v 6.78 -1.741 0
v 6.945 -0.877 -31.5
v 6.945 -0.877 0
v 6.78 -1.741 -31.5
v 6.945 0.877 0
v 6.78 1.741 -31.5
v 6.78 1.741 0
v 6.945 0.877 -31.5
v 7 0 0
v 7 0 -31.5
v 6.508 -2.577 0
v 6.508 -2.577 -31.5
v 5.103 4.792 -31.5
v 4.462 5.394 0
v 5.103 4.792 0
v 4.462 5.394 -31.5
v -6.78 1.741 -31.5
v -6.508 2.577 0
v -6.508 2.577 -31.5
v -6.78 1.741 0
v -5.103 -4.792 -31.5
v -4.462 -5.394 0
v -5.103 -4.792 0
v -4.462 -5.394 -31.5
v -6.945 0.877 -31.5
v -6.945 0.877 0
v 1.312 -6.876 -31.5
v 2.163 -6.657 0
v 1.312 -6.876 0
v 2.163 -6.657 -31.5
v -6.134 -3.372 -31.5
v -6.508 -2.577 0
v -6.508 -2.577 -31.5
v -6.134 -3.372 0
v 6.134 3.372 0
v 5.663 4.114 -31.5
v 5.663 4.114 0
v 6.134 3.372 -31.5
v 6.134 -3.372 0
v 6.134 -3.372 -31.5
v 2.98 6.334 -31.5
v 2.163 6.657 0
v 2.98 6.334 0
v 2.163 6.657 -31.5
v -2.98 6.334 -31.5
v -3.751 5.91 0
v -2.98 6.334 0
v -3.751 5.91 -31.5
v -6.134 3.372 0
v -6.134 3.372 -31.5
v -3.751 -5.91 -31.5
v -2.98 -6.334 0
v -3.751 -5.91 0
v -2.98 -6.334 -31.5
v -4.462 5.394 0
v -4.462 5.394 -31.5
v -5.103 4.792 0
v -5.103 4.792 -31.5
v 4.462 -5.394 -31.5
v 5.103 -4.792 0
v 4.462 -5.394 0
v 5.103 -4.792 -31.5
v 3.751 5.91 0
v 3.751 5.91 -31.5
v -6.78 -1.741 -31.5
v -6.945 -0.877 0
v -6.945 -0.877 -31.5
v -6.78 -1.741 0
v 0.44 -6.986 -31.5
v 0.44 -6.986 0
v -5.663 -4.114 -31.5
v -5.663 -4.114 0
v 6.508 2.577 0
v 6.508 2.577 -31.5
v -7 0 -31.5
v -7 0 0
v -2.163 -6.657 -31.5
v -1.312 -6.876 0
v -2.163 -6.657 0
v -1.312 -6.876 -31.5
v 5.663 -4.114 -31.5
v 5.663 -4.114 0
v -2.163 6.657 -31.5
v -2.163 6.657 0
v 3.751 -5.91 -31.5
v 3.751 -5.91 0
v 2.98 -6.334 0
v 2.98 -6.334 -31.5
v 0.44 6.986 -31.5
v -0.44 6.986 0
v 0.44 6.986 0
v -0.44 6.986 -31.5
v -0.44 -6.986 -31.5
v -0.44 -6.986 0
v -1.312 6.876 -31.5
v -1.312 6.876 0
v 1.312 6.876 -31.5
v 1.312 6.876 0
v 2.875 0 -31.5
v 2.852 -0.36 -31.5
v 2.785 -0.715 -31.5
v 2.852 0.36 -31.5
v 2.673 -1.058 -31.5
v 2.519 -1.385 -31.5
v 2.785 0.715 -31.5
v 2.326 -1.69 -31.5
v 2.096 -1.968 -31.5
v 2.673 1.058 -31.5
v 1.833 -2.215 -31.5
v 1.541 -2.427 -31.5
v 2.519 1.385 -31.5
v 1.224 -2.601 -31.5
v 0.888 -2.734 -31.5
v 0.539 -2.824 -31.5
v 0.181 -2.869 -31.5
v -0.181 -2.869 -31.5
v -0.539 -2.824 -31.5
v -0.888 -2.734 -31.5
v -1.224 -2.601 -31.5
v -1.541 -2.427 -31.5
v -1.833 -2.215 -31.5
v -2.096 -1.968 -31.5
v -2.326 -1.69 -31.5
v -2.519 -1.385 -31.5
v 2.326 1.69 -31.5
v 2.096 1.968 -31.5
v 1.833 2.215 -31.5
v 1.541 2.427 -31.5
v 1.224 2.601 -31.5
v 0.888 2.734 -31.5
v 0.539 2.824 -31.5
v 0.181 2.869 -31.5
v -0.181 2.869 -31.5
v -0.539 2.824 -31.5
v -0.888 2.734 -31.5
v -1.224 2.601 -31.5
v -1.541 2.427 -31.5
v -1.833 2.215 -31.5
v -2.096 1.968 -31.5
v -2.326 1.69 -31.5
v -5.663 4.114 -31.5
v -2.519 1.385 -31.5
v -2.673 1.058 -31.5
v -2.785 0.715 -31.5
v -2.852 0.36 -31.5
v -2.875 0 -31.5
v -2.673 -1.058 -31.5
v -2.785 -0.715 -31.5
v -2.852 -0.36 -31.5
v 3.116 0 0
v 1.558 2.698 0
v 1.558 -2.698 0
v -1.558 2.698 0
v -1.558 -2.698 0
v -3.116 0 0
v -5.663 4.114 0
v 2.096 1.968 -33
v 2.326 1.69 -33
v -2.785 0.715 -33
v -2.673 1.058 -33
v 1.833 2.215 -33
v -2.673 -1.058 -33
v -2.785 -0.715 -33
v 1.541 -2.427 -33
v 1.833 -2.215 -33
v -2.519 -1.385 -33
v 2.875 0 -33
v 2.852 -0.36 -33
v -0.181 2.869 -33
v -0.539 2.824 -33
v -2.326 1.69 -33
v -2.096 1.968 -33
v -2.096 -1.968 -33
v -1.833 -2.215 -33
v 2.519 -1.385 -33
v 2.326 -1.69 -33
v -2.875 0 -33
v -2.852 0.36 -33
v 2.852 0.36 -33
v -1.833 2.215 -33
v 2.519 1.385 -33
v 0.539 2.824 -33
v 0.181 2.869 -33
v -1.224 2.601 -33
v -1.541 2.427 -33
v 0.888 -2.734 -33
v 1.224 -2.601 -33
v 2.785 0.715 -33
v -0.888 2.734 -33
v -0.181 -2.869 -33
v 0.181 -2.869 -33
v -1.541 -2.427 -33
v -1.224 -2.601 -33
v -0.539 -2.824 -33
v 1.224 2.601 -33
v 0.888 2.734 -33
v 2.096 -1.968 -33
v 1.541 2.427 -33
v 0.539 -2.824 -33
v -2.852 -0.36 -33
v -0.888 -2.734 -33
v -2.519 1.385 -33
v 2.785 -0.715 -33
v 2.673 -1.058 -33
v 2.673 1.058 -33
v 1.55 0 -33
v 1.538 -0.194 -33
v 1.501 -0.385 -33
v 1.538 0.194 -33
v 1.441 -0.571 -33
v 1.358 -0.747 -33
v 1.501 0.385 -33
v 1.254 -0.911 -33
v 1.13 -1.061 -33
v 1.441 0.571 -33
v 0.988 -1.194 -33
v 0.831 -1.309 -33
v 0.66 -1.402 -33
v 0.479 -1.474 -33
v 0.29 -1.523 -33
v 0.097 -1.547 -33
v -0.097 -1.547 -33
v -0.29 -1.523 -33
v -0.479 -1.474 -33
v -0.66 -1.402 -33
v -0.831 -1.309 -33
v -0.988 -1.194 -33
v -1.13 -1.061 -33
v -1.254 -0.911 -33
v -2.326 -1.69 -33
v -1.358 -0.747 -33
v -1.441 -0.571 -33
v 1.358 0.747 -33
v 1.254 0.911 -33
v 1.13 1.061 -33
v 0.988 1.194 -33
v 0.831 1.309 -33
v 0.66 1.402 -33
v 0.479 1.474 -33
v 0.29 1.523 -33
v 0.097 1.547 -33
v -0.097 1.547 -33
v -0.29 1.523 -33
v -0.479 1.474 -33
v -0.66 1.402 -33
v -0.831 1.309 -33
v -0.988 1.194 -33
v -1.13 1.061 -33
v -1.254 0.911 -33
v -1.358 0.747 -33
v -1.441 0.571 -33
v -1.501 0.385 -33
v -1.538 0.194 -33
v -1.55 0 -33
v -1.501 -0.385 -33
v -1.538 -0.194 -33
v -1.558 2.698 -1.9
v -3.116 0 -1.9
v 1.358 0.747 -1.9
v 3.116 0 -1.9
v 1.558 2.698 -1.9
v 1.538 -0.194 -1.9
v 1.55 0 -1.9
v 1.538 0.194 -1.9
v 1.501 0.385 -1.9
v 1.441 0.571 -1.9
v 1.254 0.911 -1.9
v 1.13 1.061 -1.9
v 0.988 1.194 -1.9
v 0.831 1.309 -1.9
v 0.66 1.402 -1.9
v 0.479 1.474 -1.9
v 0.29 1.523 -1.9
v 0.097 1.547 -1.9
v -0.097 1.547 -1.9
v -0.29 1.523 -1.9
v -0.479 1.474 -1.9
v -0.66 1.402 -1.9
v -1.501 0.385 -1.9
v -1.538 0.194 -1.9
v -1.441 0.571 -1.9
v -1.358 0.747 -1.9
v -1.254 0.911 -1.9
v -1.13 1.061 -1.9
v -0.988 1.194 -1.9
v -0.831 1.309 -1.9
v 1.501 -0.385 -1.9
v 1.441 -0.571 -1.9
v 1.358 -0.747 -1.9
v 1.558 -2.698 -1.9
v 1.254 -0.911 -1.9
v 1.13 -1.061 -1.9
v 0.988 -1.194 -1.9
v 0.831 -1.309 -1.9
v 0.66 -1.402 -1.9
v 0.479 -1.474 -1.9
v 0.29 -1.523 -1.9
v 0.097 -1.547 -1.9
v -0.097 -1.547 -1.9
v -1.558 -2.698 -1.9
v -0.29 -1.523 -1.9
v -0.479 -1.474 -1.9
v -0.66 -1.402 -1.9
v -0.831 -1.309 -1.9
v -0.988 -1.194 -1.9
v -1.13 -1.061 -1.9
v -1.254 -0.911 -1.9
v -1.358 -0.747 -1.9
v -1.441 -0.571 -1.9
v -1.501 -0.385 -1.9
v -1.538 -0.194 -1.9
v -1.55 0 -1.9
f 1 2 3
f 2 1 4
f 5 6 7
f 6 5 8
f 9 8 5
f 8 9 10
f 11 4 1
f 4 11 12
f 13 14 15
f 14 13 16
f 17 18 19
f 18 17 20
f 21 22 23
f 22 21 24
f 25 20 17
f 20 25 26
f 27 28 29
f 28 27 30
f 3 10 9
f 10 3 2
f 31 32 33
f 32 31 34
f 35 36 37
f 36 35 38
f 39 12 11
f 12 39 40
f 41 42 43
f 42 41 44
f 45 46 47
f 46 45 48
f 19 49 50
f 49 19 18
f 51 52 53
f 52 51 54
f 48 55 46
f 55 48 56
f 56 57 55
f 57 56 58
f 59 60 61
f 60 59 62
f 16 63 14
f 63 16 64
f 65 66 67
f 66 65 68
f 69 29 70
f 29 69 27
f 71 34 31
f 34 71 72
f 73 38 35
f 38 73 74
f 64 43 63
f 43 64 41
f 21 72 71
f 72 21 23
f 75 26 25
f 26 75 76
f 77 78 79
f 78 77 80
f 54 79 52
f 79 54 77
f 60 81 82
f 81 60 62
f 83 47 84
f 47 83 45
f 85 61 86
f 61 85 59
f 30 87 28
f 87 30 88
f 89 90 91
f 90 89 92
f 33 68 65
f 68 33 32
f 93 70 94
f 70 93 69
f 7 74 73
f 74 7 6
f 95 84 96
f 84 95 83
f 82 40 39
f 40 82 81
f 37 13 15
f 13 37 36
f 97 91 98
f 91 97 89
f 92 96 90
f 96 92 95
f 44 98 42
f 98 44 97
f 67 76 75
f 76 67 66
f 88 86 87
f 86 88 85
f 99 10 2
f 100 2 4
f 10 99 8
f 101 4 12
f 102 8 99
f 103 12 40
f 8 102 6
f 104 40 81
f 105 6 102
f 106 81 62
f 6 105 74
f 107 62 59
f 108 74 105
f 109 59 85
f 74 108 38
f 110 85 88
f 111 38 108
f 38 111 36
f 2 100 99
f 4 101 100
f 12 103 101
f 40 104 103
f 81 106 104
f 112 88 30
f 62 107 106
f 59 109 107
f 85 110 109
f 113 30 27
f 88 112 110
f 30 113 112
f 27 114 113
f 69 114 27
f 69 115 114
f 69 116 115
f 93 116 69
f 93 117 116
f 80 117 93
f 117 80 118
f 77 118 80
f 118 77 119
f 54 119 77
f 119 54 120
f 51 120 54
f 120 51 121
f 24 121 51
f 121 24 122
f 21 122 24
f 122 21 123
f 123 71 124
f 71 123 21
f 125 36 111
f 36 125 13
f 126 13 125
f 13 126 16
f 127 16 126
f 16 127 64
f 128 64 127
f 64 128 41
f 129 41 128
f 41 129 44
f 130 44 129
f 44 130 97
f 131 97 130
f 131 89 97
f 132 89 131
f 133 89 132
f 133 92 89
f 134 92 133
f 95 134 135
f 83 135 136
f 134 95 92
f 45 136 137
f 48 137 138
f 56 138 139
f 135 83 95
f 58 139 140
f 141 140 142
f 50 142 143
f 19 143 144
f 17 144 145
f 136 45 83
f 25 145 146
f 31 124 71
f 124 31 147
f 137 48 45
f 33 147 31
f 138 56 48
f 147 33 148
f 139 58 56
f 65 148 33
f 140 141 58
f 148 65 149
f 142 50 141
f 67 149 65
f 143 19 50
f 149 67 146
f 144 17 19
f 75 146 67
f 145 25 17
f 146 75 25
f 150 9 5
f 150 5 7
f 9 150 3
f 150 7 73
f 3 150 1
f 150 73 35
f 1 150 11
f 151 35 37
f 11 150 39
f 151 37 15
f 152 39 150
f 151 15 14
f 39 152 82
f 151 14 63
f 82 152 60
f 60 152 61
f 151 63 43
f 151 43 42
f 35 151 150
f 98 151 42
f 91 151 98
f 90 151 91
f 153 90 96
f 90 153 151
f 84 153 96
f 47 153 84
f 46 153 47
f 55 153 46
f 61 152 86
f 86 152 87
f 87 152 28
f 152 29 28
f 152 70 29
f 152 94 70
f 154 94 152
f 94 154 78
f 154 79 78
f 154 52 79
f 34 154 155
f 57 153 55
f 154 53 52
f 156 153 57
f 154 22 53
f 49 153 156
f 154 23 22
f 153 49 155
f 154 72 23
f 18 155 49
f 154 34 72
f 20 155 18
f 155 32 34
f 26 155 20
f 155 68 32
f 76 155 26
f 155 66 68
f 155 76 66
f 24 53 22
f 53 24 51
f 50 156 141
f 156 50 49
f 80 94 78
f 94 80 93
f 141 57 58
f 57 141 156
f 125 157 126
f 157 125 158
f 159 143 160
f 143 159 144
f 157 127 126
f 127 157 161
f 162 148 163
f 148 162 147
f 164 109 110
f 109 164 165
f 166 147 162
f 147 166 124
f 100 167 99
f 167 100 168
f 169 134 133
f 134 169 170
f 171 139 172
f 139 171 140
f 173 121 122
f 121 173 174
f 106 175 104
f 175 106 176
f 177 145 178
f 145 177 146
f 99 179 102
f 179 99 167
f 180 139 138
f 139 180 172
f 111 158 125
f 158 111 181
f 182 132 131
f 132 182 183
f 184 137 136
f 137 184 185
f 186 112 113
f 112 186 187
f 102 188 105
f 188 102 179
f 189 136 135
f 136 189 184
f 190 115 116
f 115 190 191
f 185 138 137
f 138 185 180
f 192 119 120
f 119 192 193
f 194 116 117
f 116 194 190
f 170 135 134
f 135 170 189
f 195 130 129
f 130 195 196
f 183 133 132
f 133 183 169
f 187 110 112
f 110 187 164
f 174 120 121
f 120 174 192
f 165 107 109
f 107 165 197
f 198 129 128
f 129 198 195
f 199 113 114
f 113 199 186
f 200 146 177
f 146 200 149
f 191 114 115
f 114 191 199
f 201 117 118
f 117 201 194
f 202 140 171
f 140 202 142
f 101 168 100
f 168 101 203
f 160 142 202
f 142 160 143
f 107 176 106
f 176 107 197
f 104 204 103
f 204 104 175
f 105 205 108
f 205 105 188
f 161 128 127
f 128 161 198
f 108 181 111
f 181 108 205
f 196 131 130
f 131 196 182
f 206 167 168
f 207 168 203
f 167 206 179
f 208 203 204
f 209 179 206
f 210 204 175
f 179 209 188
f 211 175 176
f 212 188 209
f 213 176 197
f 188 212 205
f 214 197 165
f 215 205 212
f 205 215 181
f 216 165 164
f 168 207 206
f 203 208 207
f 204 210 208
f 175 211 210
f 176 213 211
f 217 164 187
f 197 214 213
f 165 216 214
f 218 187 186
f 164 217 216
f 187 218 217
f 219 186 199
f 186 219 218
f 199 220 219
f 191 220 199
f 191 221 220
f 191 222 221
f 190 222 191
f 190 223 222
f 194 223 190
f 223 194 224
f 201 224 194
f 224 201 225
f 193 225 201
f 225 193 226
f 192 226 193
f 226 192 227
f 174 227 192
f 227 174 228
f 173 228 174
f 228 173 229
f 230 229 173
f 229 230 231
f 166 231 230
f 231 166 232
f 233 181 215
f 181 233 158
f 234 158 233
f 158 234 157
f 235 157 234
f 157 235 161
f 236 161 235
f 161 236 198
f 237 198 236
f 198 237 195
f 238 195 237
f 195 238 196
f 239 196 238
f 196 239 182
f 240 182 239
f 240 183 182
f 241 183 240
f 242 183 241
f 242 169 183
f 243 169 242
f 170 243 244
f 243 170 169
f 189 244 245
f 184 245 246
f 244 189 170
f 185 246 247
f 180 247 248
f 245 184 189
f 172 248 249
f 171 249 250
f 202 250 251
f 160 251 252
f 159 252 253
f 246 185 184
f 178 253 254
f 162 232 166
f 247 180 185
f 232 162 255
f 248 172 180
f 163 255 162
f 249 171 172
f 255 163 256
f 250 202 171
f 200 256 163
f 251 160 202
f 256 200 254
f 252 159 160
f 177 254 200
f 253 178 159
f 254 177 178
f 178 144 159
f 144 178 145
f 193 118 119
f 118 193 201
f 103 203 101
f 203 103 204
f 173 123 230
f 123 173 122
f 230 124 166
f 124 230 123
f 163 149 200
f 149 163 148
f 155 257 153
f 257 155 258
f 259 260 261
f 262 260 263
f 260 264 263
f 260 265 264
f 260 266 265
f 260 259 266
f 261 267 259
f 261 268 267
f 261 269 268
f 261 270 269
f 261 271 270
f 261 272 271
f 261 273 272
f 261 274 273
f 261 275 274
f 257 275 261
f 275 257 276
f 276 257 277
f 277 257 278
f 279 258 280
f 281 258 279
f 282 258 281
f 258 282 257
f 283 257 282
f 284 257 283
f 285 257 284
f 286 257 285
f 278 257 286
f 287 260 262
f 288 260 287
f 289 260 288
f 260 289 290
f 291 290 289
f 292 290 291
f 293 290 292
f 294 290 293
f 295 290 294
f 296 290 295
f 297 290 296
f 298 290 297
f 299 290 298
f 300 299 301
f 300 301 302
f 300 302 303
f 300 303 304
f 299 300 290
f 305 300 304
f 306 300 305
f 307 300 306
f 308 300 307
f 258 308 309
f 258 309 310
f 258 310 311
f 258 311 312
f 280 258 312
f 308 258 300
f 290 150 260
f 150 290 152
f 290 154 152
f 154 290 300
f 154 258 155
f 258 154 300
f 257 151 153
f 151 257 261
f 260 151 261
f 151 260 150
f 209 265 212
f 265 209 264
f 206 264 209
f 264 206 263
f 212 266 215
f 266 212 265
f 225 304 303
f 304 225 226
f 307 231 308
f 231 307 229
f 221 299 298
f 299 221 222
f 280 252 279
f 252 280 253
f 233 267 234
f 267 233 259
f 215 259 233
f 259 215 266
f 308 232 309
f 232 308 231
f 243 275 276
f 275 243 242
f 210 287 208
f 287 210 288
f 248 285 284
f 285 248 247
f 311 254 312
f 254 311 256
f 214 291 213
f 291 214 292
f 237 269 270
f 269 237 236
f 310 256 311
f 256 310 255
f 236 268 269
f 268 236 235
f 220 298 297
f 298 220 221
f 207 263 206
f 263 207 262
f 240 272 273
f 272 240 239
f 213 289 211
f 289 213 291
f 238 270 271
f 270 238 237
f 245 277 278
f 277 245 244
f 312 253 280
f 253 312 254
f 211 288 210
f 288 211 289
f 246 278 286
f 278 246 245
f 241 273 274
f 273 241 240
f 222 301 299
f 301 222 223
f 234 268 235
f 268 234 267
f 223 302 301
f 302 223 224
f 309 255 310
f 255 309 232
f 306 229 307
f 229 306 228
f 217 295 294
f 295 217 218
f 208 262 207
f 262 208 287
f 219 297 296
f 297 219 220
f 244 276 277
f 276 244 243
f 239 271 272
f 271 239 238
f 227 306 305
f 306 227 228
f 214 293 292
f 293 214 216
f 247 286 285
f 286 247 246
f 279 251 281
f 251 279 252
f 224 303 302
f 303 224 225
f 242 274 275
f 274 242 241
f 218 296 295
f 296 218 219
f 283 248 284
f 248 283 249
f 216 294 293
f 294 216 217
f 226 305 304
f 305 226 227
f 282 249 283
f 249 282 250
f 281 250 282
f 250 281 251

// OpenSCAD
$fn = 50;

difference() {
	union() {
		translate(v = [0, 0, -31.5]) {
			cylinder(h = 31.5, r = 7.0);
		}
		#translate(v = [0, 0, -33.0]) {
			cylinder(h = 33, r = 2.875);
		}
	}
	union() {
		translate(v = [0, 0, 0]) {
			rotate(a = [0, 0, 0]) {
				difference() {
					union() {
						translate(v = [0, 0, -1.9]) {
							linear_extrude(height = 1.9) {
								polygon(points = [[3.1158, 0.0], [1.5579000000000005, 2.698361953111554], [-1.5578999999999994, 2.6983619531115544], [-3.1158, 3.815754496783323e-16], [-1.5579000000000014, -2.6983619531115535], [1.557899999999998, -2.6983619531115552]]);
							}
						}
					}
					union();
				}
			}
		}
		#translate(v = [0, 0, -100.0]) {
			cylinder(h = 200, r = 1.55);
		}
	}
}
